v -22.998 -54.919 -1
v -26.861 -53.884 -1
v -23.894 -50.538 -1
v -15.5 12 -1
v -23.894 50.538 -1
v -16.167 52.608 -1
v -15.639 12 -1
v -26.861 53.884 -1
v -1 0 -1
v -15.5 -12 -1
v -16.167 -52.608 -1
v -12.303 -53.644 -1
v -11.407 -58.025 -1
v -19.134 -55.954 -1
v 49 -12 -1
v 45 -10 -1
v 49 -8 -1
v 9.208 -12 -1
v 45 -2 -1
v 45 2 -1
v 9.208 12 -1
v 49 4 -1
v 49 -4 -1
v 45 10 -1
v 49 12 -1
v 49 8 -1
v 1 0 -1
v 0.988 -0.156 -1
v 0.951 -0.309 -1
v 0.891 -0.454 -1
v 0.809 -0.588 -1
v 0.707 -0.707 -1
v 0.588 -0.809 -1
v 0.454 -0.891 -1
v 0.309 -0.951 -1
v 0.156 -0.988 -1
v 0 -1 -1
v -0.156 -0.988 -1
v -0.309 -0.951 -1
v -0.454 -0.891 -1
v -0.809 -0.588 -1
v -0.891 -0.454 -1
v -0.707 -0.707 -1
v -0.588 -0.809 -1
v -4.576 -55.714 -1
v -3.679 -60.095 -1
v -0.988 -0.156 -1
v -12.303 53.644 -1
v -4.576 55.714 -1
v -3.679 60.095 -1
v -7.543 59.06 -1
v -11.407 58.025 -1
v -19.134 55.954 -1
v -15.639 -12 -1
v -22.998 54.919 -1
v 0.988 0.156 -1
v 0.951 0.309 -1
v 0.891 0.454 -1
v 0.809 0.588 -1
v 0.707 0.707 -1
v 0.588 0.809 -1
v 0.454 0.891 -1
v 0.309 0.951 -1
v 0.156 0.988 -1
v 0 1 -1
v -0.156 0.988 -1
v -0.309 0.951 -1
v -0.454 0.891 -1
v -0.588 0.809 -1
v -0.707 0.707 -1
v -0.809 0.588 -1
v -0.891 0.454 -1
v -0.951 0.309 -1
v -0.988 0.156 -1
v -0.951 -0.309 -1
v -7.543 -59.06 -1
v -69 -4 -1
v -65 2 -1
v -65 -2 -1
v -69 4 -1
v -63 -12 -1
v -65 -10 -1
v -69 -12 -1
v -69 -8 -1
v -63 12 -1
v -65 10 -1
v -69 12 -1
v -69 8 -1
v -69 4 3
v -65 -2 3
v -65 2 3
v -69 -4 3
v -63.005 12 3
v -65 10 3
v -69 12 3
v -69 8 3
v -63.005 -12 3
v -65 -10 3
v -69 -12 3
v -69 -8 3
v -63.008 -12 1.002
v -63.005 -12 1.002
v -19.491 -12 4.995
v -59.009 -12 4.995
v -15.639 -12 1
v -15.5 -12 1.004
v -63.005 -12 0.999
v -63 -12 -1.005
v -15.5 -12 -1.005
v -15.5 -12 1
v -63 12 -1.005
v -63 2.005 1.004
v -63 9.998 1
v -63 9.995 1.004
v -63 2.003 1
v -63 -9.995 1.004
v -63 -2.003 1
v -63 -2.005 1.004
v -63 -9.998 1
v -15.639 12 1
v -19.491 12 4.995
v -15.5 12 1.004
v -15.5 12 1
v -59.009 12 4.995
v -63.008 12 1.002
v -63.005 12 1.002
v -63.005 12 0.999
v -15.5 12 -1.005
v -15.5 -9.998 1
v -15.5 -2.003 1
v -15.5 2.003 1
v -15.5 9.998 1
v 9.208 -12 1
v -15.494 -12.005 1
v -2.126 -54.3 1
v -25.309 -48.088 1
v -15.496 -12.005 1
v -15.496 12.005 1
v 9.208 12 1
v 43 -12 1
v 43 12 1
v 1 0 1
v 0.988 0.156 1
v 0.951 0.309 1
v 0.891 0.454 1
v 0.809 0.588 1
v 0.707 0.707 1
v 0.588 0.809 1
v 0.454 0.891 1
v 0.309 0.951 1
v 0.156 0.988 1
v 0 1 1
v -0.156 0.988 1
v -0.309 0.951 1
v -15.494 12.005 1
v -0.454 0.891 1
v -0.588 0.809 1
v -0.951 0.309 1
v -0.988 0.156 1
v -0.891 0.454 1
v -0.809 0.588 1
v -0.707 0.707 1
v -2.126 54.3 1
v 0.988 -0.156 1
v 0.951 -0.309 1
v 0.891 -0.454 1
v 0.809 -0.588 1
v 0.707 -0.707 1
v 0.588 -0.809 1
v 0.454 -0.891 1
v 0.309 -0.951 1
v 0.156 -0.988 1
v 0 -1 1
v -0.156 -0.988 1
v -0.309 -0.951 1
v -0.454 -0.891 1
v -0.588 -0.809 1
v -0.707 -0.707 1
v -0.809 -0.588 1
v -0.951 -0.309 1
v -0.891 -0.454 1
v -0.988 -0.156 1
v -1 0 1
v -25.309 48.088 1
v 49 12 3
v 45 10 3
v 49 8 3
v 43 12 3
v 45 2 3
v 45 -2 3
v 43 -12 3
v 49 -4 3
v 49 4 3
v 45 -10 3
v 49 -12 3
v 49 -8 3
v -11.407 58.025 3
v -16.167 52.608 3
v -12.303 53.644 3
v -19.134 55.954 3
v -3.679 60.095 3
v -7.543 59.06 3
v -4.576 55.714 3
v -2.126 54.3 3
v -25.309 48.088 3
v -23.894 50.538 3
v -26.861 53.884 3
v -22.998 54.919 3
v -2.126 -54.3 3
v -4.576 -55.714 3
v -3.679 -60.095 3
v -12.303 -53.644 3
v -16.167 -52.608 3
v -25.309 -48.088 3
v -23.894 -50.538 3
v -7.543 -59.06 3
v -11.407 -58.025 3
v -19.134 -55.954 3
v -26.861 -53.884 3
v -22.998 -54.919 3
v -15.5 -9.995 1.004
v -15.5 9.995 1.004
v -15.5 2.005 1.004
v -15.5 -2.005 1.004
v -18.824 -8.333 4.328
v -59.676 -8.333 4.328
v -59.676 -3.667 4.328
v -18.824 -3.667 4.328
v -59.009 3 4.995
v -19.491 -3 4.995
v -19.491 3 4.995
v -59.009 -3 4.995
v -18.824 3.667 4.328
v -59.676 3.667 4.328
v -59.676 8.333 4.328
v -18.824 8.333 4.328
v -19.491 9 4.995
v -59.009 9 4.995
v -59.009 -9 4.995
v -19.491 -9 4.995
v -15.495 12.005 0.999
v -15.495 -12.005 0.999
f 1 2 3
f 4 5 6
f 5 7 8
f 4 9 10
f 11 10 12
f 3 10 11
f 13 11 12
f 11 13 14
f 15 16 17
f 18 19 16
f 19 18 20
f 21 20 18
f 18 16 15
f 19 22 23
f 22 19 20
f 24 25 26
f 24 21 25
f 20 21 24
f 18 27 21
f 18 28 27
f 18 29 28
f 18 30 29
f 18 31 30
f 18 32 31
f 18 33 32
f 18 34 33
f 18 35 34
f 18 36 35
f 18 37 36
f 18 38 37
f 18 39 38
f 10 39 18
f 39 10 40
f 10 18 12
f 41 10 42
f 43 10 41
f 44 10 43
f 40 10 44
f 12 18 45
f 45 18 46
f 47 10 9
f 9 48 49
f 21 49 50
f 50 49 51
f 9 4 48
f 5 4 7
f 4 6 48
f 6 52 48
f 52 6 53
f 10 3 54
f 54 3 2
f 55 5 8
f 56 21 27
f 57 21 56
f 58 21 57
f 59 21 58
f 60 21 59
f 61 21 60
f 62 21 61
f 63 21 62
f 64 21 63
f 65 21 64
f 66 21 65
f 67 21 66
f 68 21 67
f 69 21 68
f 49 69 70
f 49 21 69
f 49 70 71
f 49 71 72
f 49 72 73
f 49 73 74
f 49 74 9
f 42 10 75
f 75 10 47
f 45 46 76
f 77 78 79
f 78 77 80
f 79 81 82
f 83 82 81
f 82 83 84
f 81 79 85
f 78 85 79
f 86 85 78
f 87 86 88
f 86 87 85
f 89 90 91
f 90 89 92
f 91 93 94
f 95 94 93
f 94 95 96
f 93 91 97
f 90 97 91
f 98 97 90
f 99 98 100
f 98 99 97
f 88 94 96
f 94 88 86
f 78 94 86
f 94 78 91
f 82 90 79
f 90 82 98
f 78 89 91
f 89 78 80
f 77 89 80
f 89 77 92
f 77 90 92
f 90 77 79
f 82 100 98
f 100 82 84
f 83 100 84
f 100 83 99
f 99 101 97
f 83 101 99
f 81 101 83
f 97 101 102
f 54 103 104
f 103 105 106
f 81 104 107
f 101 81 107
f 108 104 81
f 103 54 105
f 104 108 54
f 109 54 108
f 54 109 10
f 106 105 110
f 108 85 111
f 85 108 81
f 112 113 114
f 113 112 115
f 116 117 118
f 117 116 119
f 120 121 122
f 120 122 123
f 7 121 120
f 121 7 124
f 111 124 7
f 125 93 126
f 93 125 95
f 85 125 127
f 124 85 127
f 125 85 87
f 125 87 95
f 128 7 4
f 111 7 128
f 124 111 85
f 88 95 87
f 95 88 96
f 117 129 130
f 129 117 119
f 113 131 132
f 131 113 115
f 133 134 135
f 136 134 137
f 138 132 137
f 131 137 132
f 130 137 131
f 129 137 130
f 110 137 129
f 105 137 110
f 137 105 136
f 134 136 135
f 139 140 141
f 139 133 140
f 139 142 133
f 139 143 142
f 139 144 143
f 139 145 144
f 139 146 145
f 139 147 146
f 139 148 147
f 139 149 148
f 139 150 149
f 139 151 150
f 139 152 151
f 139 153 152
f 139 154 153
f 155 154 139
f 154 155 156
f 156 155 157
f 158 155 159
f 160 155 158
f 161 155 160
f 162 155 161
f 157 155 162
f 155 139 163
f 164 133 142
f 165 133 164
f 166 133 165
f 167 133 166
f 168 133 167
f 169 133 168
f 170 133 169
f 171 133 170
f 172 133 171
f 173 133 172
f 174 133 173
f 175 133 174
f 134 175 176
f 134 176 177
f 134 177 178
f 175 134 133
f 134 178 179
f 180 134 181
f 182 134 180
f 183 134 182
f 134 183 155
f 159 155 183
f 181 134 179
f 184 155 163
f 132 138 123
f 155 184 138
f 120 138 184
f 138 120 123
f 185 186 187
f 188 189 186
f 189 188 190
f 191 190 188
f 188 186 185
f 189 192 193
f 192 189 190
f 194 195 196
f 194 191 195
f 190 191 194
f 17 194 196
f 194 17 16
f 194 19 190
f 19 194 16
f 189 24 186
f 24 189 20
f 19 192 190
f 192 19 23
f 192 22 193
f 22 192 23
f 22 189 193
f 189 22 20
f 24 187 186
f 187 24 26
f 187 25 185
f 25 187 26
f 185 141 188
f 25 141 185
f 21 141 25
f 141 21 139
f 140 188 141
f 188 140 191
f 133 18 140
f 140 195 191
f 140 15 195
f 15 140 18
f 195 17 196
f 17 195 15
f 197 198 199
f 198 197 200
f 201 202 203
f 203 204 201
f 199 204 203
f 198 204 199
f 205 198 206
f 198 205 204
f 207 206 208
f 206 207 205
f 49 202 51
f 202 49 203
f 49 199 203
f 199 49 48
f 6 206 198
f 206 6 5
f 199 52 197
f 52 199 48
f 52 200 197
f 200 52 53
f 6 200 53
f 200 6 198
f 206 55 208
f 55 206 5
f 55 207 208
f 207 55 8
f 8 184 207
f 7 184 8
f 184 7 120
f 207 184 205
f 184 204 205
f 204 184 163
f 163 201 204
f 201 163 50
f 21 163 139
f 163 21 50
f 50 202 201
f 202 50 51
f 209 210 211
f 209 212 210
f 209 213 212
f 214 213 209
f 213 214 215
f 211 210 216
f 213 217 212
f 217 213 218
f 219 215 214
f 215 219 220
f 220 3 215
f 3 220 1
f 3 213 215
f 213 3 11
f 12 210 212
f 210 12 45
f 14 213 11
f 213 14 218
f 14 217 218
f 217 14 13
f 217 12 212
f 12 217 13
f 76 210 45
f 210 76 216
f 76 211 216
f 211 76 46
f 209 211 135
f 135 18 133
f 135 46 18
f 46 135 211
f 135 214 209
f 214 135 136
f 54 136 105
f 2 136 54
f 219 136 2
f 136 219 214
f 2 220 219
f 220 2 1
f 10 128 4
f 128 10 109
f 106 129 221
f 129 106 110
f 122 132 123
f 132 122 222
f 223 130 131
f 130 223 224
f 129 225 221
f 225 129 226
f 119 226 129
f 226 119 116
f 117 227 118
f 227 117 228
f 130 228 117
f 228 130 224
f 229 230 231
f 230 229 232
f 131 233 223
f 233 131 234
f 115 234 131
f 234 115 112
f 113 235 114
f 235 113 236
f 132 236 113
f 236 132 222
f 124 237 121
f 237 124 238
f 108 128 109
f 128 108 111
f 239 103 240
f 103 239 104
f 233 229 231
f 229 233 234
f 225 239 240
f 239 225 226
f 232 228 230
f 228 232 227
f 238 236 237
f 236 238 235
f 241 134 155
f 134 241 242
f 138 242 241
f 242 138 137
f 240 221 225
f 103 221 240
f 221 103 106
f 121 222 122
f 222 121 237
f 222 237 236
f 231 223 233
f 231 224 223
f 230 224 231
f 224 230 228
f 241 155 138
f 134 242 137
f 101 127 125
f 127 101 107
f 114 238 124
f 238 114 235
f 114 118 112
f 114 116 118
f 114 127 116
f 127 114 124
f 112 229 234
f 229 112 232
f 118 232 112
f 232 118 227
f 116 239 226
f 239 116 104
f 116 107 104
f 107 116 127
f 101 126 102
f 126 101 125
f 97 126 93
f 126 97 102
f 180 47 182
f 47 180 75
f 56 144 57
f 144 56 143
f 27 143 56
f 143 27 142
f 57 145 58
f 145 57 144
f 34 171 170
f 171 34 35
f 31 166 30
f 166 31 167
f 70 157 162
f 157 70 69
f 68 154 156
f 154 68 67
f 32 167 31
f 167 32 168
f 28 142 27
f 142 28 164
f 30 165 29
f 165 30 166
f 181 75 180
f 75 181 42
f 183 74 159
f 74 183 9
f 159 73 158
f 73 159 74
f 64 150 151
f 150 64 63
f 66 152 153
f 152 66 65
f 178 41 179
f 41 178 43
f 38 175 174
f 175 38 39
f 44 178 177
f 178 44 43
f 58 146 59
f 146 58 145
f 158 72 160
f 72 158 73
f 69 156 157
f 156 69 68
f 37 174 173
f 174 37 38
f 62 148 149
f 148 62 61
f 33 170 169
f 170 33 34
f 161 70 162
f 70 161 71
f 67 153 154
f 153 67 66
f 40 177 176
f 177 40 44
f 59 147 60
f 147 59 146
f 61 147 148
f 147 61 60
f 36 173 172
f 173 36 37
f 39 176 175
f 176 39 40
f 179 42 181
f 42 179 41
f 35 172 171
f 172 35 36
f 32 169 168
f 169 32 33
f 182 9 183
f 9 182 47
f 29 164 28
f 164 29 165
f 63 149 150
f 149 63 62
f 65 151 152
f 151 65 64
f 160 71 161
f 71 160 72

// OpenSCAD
// Written by Volksswitch <www.volksswitch.org>
//
// To the extent possible under law, the author(s) have dedicated all
// copyright and related and neighboring rights to this software to the
// public domain worldwide. This software is distributed without any
// warranty.
//
// You should have received a copy of the CC0 Public Domain Dedication along with this software.
// If not, see <http://creativecommons.org/publicdomain/zero/1.0/>.


//------------------------------------------------------------------
// User Inputs
//------------------------------------------------------------------

/*[Part to Print]*/
part = "arm connector"; // [arm connector,front arm,side arm,back arm,pointer mount,pointer retention bolt]

/*[Arm Measurements]*/
brow_distance = 160; // [50:250]
top_of_ear_distance = 140; // [50:250]
//set to zero for shorter side arms
bottom_of_ear_distance = 0; // [0:300]
curve_of_skull_distance = 160; // [50:250]
//set to zero for shorter back arm
neck_distance = 0; // [0:300]
temple_angle = 75; // [60:90]
arm_thickness = 2; // [1:5]

/*[Elastic Measurements]*/
hat_band_width = 10; // [5:20]
hat_band_thickness = 1; // [1:2]
neck_band_width = 10; // [5:20]
neck_band_thickness = 1; // [1:2]
chin_band_width = 10; // [5:20]
chin_band_thickness = 1; // [1:4]
hat_band_attachment_type = "post"; // ["double slot", "post", "none"]
neck_band_attachment_type = "post"; // ["double slot", "post", "none"]
chin_band_attachment_type = "post"; // ["double slot", "post", "none"]

/*[Pointer Mount Measurements]*/
pointer_diameter = 9; // [5:15]
pointer_tightness = 0; // [-9:9]
pointer_angle = 0; // [0:20]
//affects only the pointer mount
pointer_retention_bolt_tightness = 0; // [-9:9]
//affects only the pointer mount
pointer_mount_tightness = 0; // [-9:9]
add_laser_pointer_slot = "no"; // ["yes","no"]
slot_width = 4; //[2:8]
slot_height = 3; // [2:5]

/*[Accessory Hole Info]*/
//separate numbers with commas and include brackets
front_accessory_holes = []; 
//separate numbers with commas and include brackets
side_accessory_holes = []; 
//separate numbers with commas and include brackets
back_accessory_holes = []; 
//separate numbers with commas and include brackets
connector_accessory_holes = []; 
accessory_hole_diameter = 8; // [1:10]

/*[Hidden]*/
//General variables
arm_width = 24;
dovetail_thickness = max(4,arm_thickness);
fudge = 0.005;
$fn = 40;

//arm_connector variables
front_base = 65;
side_base = 55;
back_base = 45;

//elastic variables
h_band_width = hat_band_width + 2;
h_band_thickness = hat_band_thickness + 1;
n_band_width = neck_band_width + 2;
n_band_thickness = neck_band_thickness + 1;
c_band_width = chin_band_width + 2;
c_band_thickness = chin_band_thickness + 1;

//arm variables
chin_strap_tab_dist = c_band_thickness*2 + 8;

front_arm = brow_distance - front_base - 4;
side_arm = (bottom_of_ear_distance==0) ? top_of_ear_distance - side_base + chin_strap_tab_dist + 2 - 4
										 : bottom_of_ear_distance - side_base + 2 + n_band_width + chin_strap_tab_dist - 4;
back_arm = (neck_distance==0) ? curve_of_skull_distance - back_base + 2 - 4 : neck_distance - back_base - 4;


//bolt and mount variables
mount_height = 20;
mount_len = 20;

grip_dia = 15;
grip_len = 10;
thread_len = 15;
thread_dia = 10;
bolt_scale = 1;
threaded_hole_scale = 1.05-pointer_retention_bolt_tightness/100;
threaded_hole_len = 15;
p_diam = pointer_diameter + pointer_tightness/10;


// ************* Main Program *****************
if (part == "arm connector"){
	difference(){
		arm_connector();
		count=len(connector_accessory_holes);
		echo(count);
		if(count>0){
			for(i=[0:count-1]){
				translate([-connector_accessory_holes[i],0,0])
				cylinder(d=accessory_hole_diameter,h=20,center=true);
			}
		}
	}
}
else if (part=="front arm"){
	difference(){
		front_arm();
		if(len(front_accessory_holes)>0){
			for(i=[0:len(front_accessory_holes)-1]){
				// if(front_accessory_holes[i] > 0){
					translate([front_accessory_holes[i]-front_base-front_arm/2-4,0,0])
					cylinder(d=accessory_hole_diameter,h=arm_thickness+fudge*2,center=true);
				// }
			}
		}
	}
}
else if (part=="side arm"){
	difference(){
		side_arm();
		if(len(side_accessory_holes)>0){
			for(i=[0:len(side_accessory_holes)-1]){
				// if(side_accessory_holes[i] > 0){
					translate([side_accessory_holes[i]-side_base-side_arm/2-4,0,0])
					cylinder(d=accessory_hole_diameter,h=arm_thickness+fudge*2,center=true);
				// }
			}
		}
	}
}
else if (part=="back arm"){
	difference(){
		back_arm();
		if(len(back_accessory_holes)>0){
			for(i=[0:len(back_accessory_holes)-1]){
				// if(back_accessory_holes[i] > 0){
					translate([back_accessory_holes[i]-back_base-back_arm/2-4,0,0])
					cylinder(d=accessory_hole_diameter,h=arm_thickness+fudge*2,center=true);
				// }
			}
		}
	}
}
else if (part=="pointer mount"){
	pointer_mount();
}
else if (part=="pointer retention bolt"){
	bolt();
	}

//************ Modules ***********

module arm_connector(){
	difference(){
		union(){
			translate([-front_base/2,0,0])
			union(){
				translate([-front_base/2,0,-arm_thickness/2])
				rotate([0,0,180])
				arm_connector_dove_tail();
				cube([front_base,arm_width,arm_thickness],center=true);
			}

			rotate([0,0,180])
			translate([-back_base/2,0,0])
			union(){
				translate([-back_base/2,0,-arm_thickness/2])
				rotate([0,0,180])
				arm_connector_dove_tail();
				cube([back_base,arm_width,arm_thickness],center=true);
			}

			rotate([0,0,-temple_angle])
			translate([-side_base/2,0,0])
			union(){
				translate([-side_base/2,0,-arm_thickness/2])
				rotate([0,0,180])
				arm_connector_dove_tail();
				cube([side_base,arm_width,arm_thickness],center=true);
			}

			rotate([0,0,temple_angle])
			translate([-side_base/2,0,0])
			union(){
				translate([-side_base/2,0,-arm_thickness/2])
				rotate([0,0,180])
				arm_connector_dove_tail();
				cube([side_base,arm_width,arm_thickness],center=true);
			}
			
			translate([-15.5,0,arm_thickness/2-2-fudge])
			arm_connector_pointer_dove_tail();
		}
		//center marker
		cylinder(d=2,h=arm_thickness+fudge*2,center=true);
		
		//chamfers on pointer mounting rails
		chamfer_len = 4 * 1.414 + fudge;
		
		translate([-15.5+fudge,0,arm_thickness/2+chamfer_len/2*1.414])
		difference(){
			rotate([0,45,0])
			cube([chamfer_len,24+fudge*2,chamfer_len],center=true);
			translate([4,0,0])
			cube([8,24+fudge*4,8],center=true);
		}
		
		translate([-front_base+2-fudge,0,arm_thickness/2+chamfer_len/2*1.414])
		rotate([0,180,0])
		difference(){
			rotate([0,45,0])
			cube([chamfer_len,24+fudge*2,chamfer_len],center=true);
			translate([4,0,0])
			cube([8,24+fudge*4,8],center=true);
		}
	}
}

module arm_connector_dove_tail(){
	translate([-2,-12,0])
	difference(){
		linear_extrude(height=dovetail_thickness)
		polygon([[0,0],[0,24],[6,24],[6,20],[2,22],[2,14],[6,16],[6,8],[2,10],[2,2],[6,4],[6,0]]);
	
		// translate([6.5,16.5,-fudge])
		// linear_extrude(height=dovetail_thickness+fudge*2)
		// polygon([[0,0],[-2,0],[0,-2]]);
		
		// translate([6.5,4.5,-fudge])
		// linear_extrude(height=dovetail_thickness+fudge*2)
		// polygon([[0,0],[-2,0],[0,-2]]);
		
		// translate([6.5,19.5,-fudge])
		// linear_extrude(height=dovetail_thickness+fudge*2)
		// polygon([[0,0],[-2,0],[0,2]]);
		
		// translate([6.5,7.5,-fudge])
		// linear_extrude(height=dovetail_thickness+fudge*2)
		// polygon([[0,0],[-2,0],[0,2]]);
	}
}

module arm_connector_pointer_dove_tail(){
	rotate([0,-90,0])
	difference(){
		translate([0,-arm_width/2,0])
		linear_extrude(height=front_base-17.5)
		polygon([[0,0],[0,24],[6,24],[6,20],[2,22],[2,14],[6,16],[6,8],[2,10],[2,2],[6,4],[6,0]]);
		
		if(arm_thickness==1){
			translate([.5+fudge,0,23.5])
			rotate([0,90,0])
			cube([front_base-16.5+fudge*2,24+fudge*2,1+fudge*2],center=true);
		}
	
		translate([6.5,4.5,0])
		linear_extrude(height=front_base-17)
		polygon([[0,0],[-2,0],[0,-2]]);
		
		translate([6.5,-7.5,0])
		linear_extrude(height=front_base-17)
		polygon([[0,0],[-2,0],[0,-2]]);
		
		translate([6.5,-4.5,0])
		linear_extrude(height=front_base-17)
		polygon([[0,0],[-2,0],[0,2]]);
		
		translate([6.5,7.5,0])
		linear_extrude(height=front_base-17)
		polygon([[0,0],[-2,0],[0,2]]);
	}
}

module arm_dove_tail(){
	translate([-6,-12,0])
	difference(){
		linear_extrude(height=dovetail_thickness)
		polygon([[6,24],[6,20],[2,22],[2,14],[6,16],[6,8],[2,10],[2,2],[6,4],[6,0],[8,0],[8,24],[6,24]]);
		
		// translate([1.5,22.5,-fudge])
		// linear_extrude(height=dovetail_thickness+fudge*2)
		// polygon([[0,0],[2,0],[0,-2]]);
		
		// translate([1.5,10.5,-fudge])
		// linear_extrude(height=dovetail_thickness+fudge*2)
		// polygon([[0,0],[2,0],[0,-2]]);
		
		// translate([1.5,13.5,-fudge])
		// linear_extrude(height=dovetail_thickness+fudge*2)
		// polygon([[0,0],[2,0],[0,2]]);
		
		// translate([1.5,1.5,-fudge])
		// linear_extrude(height=dovetail_thickness+fudge*2)
		// polygon([[0,0],[2,0],[0,2]]);
	}
	
}

module front_arm(){
	difference(){
		union(){
			translate([-front_arm/2,0,-arm_thickness/2])
			arm_dove_tail();
			translate([0,0,-arm_thickness/2])
			linear_extrude(height=arm_thickness)
			offset(r=2)
			square([front_arm-4,arm_width-4],center=true);
		}
		
		if (hat_band_attachment_type=="double slot"){
			translate([front_arm/2-h_band_width/2-2,0,0])
			four_slots(h_band_width,h_band_thickness);
		}
	}
	
	if (hat_band_attachment_type=="post"){
		translate([front_arm/2-h_band_width/2-2,0,0])
		post(h_band_width,h_band_thickness);
	}
}

module back_arm(){
	difference(){
		union(){
			translate([-back_arm/2,0,-arm_thickness/2])
			arm_dove_tail();
			translate([0,0,-arm_thickness/2])
			linear_extrude(height=arm_thickness)
			offset(r=2)
			square([back_arm-4,arm_width-4],center=true);
		}
		
		if (neck_distance==0){
			if (hat_band_attachment_type=="double slot"){
				translate([back_arm/2-h_band_width/2-2,0,0])
				four_slots(h_band_width,h_band_thickness);
			}
		}
		else{
			if (hat_band_attachment_type=="double slot"){
				translate([-back_arm/2+curve_of_skull_distance-back_base-h_band_width/2,0,0])
				four_slots(h_band_width,h_band_thickness);
			}		
			if (neck_band_attachment_type=="double slot"){
				translate([back_arm/2-n_band_width/2-2,0,0])
				four_slots(n_band_width,n_band_thickness);
			}
		}
	}
	if (neck_distance==0){
		if (hat_band_attachment_type=="post"){
			translate([back_arm/2-h_band_width/2-2,0,0])
			post(h_band_width,h_band_thickness);
		}
	}
	else{
		if (hat_band_attachment_type=="post"){
				translate([-back_arm/2+curve_of_skull_distance-back_base-h_band_width/2,0,0])
				post(h_band_width,h_band_thickness);
		}
		if (neck_band_attachment_type=="post"){
				translate([back_arm/2-n_band_width/2-2,0,0])
				post(n_band_width,n_band_thickness);
		}
	}
}

module side_arm(){
	difference(){
		union(){
			translate([-side_arm/2,0,-arm_thickness/2])
			arm_dove_tail();
			translate([0,0,-arm_thickness/2])
			linear_extrude(height=arm_thickness)
			offset(r=2)
			square([side_arm-4,arm_width-4],center=true);
		}
		
		if(bottom_of_ear_distance == 0){
			if(hat_band_attachment_type=="double slot"){
				translate([-side_arm/2+top_of_ear_distance-side_base-h_band_width/2,0,0])
				four_slots(h_band_width,h_band_thickness);
			}
		}
		else{
			if(hat_band_attachment_type=="double slot"){
				translate([-side_arm/2+top_of_ear_distance-side_base-h_band_width/2,0,0])
				four_slots(h_band_width,h_band_thickness);
			}
			if(neck_band_attachment_type=="double slot"){
				translate([-side_arm/2+bottom_of_ear_distance-side_base+n_band_width/2+2,0,0])
				four_slots(n_band_width,n_band_thickness);
			}
		}
		if(chin_band_attachment_type=="double slot"){
			translate([side_arm/2-c_band_thickness/2-2,0,0])
			rotate([0,0,90])
			slot(c_band_width,c_band_thickness);

			translate([side_arm/2-c_band_thickness/2*3-4,0,0])
			rotate([0,0,90])
			slot(c_band_width,c_band_thickness);
		}
	}
	if(bottom_of_ear_distance == 0){
		if(hat_band_attachment_type=="post"){
			translate([-side_arm/2+top_of_ear_distance-side_base-h_band_width/2,0,0])
			post(h_band_width,h_band_thickness);
		}
	}
	else{
		if(hat_band_attachment_type=="post"){
			translate([-side_arm/2+top_of_ear_distance-side_base-h_band_width/2,0,0])
			post(h_band_width,h_band_thickness);
		}
		if(neck_band_attachment_type=="post"){
			translate([-side_arm/2+bottom_of_ear_distance-side_base+n_band_width/2+2,0,0])
			post(n_band_width,n_band_thickness);
		}
	}
	if(chin_band_attachment_type=="post"){
		translate([side_arm/2-c_band_thickness/2-2,0,0])
		rotate([0,0,90])
		post(c_band_width,c_band_thickness);
	}
}

module four_slots(elastic_band_width,elastic_band_thickness){
	translate([0,-arm_width/2+elastic_band_thickness/2+2,0])
	slot(elastic_band_width,elastic_band_thickness);
	translate([0,-arm_width/2+elastic_band_thickness/2*3+4,0])
	slot(elastic_band_width,elastic_band_thickness);
	translate([0,arm_width/2-elastic_band_thickness/2-2,0])
	slot(elastic_band_width,elastic_band_thickness);
	translate([0,arm_width/2-elastic_band_thickness/2*3-4,0])
	slot(elastic_band_width,elastic_band_thickness);
}

module slot(width,thickness){
	cube([width-thickness,thickness,arm_thickness+fudge*2],center=true);
	translate([-width/2+thickness/2,0,0])
	cylinder(d=thickness,h=arm_thickness+fudge*2,center=true);
	translate([width/2-thickness/2,0,0])
	cylinder(d=thickness,h=arm_thickness+fudge*2,center=true);
}

module post(width,thickness){
	translate([0,0,arm_thickness/2-fudge*2])
	cylinder(d1=3,d2=6,h=5);
}

module pointer_mount(){
	rotate([0,-90,0])
	union(){
		difference(){
			intersection(){
				translate([0,0,-10])
				linear_extrude(height=20)
				offset(delta=2,chamfer=true)
				square([p_diam+12-4,24-4],center=true);
				
				
				rotate([0,90,0])
				translate([0,0,-(p_diam+12)/2])
				linear_extrude(height=p_diam+12)
				offset(delta=2,chamfer=true)
				square([20-4,24-4],center=true);
			}
			
			//pointer hole
			cylinder(d=p_diam,h=20+fudge*2,center=true);
			
			//threaded hole for pointer retention bolt
			translate([-mount_height/2+threaded_hole_len-5-fudge,0,0])
			rotate([0,-90,0])
			threads(thread_dia,1.5,threaded_hole_len,threaded_hole_scale,60);
			
			if(add_laser_pointer_slot=="yes"){
				translate([-(p_diam+slot_height)/2+.5,0,0])
				rotate([0,90,0])
				cube([20+fudge*2,slot_width,slot_height],center=true);
			}
		}

		rotate([0,180,0])
		translate([-(p_diam+12)/2,0,0])
		pointer_dove_tails();
	}
}

module pointer_dove_tails_base(){
	a = cos(pointer_angle) * 20;
	b = sin(pointer_angle) * 20;
	
	translate([0,0,-a/2])
	rotate([0,-90,0])
	rotate([90,0,0])
	linear_extrude(height=15)
	polygon([[0,0],[a,0],[0,b]]);

}

module pointer_dove_tails(){
	a = cos(pointer_angle) * 20;
	b = sin(pointer_angle) * 20;
	
	//dove tails base
	base_width = 16;
	
	translate([0,base_width/2,-a/2])
	rotate([0,-90,0])
	rotate([90,0,0])
	linear_extrude(height=base_width)
	polygon([[0,0],[a,0],[0,b]]);


	//dove tails
	gap = pointer_mount_tightness/10;
	
	translate([0,0,a/2])
	rotate([0,pointer_angle,0])
	translate([0,0,-10])
	difference(){
		translate([-6,-12,-10])
		linear_extrude(height=20)
		polygon([[6,24],[6,20+gap],[2-gap,22+gap],[2-gap,14-gap],[6,16-gap],[6,8+gap],[2-gap,10+gap],[2-gap,2-gap],[6,4-gap],[6,0],[8,0],[8,24]]);
		
		//remove platform
		translate([1,0,0])
		rotate([0,90,0])
		cube([20+fudge*2,24+fudge*2,2+fudge*2],center=true);
	
		translate([-4.5-gap,2-gap,-10-fudge])
		linear_extrude(height=20+fudge*2)
		polygon([[0,0],[2,0],[0,2]]);
		
		translate([-4.5-gap,-10-gap,-10-fudge])
		linear_extrude(height=20+fudge*2)
		polygon([[0,0],[2,0],[0,2]]);
		
		translate([-4.5-gap,-2+gap,-10-fudge])
		linear_extrude(height=20+fudge*2)
		polygon([[0,0],[2,0],[0,-2]]);
		
		translate([-4.5-gap,10+gap,-10-fudge])
		linear_extrude(height=20+fudge*2)
		polygon([[0,0],[2,0],[0,-2]]);
		
		translate([-4-gap-fudge,0,-10])
		rotate([0,180,0])
		end_trim();
		
		translate([-4-gap-fudge,0,10])
		rotate([0,180,0])
		end_trim();
	}
}

module end_trim(){
	chamfer_len = 4 * 1.414 + fudge;
	difference(){
		rotate([0,45,0])
		cube([chamfer_len,24+fudge*2,chamfer_len],center=true);
		translate([4,0,0])
		cube([8,24+fudge*4,8],center=true);
	}
}

module bolt(){
	difference(){
		union(){
			translate([0,0,grip_len-fudge])
			threads(thread_dia,1.5,thread_len,bolt_scale,60);
			cylinder(d=grip_dia,h=grip_len,$fn=8);
		}

		translate([0,0,grip_len+thread_len+fudge])
		rotate_extrude($fn=200)
		polygon([[4,0],[thread_dia/2,0],[thread_dia/2,-2]]);
	}
}



//sine_thread.scad by Ron Butcher (aka. Ming of Mongo), 
//with bits borrowed from ISOThread by Trevor Moseley
//
//Thread libs for OpenSCAD are hideously slow.  I love OpenSCAD, but that's the fact.
//But I found that, if you are cool with approximating iso threads with a sine wave,
//you can make very smooth threads really fast just by spinning a circle around.
//
//Actually, you could make near perfect threads by specifying a polygon other than a circle
//with the exact screw cross-section you need, but I leave that as an excersize for those
//who care more than I do.  Circle works for me.
//
//threads module gives a threaded rod
//hex_nut(diameter) does just what you think
//hex_screw(diameter, length) gives an M(diameter) hex head screw with length mm of thread.
//
//defaults get you an M4 x 10mm bolt and an M4 nut.  If you want something non standard,
//you can supply the pitch, head height and diameter, rez(olution) and a scaling factor
//to help make up for the oddities of everyone's individual printers and settings.
//
//Finer layering gets you better results.  At .1mm layer height, my M4 threads kick ass.
//
//This is all metric, but you can translate US diameters and pitch to mm easily enough.


module threads(diameter=4,pitch=undef,length=10,scale=1,rez=20){
	pitch = (pitch!=undef) ? pitch : get_coarse_pitch(diameter);
	twist = length/pitch*360;
	depth=pitch*.6;
	linear_extrude(height = length, center = false, convexity = 10, twist = -twist, $fn = rez)
		translate([depth/2, 0, 0]){
			circle(r = scale*diameter/2-depth/2);
		}
}	

module hex_nut(	diameter = 4,
				height = undef, 
				span = undef,  
				pitch = undef, 
				scale = 1, 
				rez = 20){
	height = (height!=undef) ? height : hex_nut_hi(diameter);
	span = (span!=undef) ? span : hex_nut_dia(diameter);
	
	difference(){
		cylinder(h=height,r=span/2, $fn=6); //six sided cylinder
		threads(diameter,pitch,height,scale,rez);
		cylinder(h=diameter/2, r1=diameter/2, r2=0, $fn=rez);
		translate([0,0,height+.0001])
		rotate([180,0,0])
		cylinder(h=diameter/2, r1=diameter/2, r2=0, $fn=rez);
	}
}

module hex_screw(diameter = 4, 
				length = 10, 
				height = undef, 
				span = undef, 
				pitch = undef, 
				scale = 1, 
				rez = 20){
	height = (height!=undef) ? height : hex_bolt_hi(diameter);
	span = (span!=undef) ? span : hex_bolt_dia(diameter);
	cylinder(h=height,r=span/2,$fn=6); //six sided cylinder
	translate([0,0,height])
	threads(diameter,pitch,length,scale,rez);
}

// Lookups shamelessly stolen from ISOThread.scad by Trevor Moseley
// function for thread pitch
function get_coarse_pitch(dia) = lookup(dia, [
[1,0.25],[1.2,0.25],[1.4,0.3],[1.6,0.35],[1.8,0.35],[2,0.4],[2.5,0.45],[3,0.5],[3.5,0.6],[4,0.7],[5,0.8],[6,1],[7,1],[8,1.25],[10,1.5],[12,1.75],[14,2],[16,2],[18,2.5],[20,2.5],[22,2.5],[24,3],[27,3],[30,3.5],[33,3.5],[36,4],[39,4],[42,4.5],[45,4.5],[48,5],[52,5],[56,5.5],[60,5.5],[64,6],[78,5]]);

// function for hex nut diameter from thread size
function hex_nut_dia(dia) = lookup(dia, [
[3,6.4],[4,8.1],[5,9.2],[6,11.5],[8,16.0],[10,19.6],[12,22.1],[16,27.7],[20,34.6],[24,41.6],[30,53.1],[36,63.5]]);
// function for hex nut height from thread size
function hex_nut_hi(dia) = lookup(dia, [
[3,2.4],[4,3.2],[5,4],[6,3],[8,5],[10,5],[12,10],[16,13],[20,16],[24,19],[30,24],[36,29]]);


// function for hex bolt head diameter from thread size
function hex_bolt_dia(dia) = lookup(dia, [
[3,6.4],[4,8.1],[5,9.2],[6,11.5],[8,14.0],[10,16],[12,22.1],[16,27.7],[20,34.6],[24,41.6],[30,53.1],[36,63.5]]);
// function for hex bolt head height from thread size
function hex_bolt_hi(dia) = lookup(dia, [
[3,2.4],[4,3.2],[5,4],[6,3.5],[8,4.5],[10,5],[12,10],[16,13],[20,16],[24,19],[30,24],[36,29]]);
